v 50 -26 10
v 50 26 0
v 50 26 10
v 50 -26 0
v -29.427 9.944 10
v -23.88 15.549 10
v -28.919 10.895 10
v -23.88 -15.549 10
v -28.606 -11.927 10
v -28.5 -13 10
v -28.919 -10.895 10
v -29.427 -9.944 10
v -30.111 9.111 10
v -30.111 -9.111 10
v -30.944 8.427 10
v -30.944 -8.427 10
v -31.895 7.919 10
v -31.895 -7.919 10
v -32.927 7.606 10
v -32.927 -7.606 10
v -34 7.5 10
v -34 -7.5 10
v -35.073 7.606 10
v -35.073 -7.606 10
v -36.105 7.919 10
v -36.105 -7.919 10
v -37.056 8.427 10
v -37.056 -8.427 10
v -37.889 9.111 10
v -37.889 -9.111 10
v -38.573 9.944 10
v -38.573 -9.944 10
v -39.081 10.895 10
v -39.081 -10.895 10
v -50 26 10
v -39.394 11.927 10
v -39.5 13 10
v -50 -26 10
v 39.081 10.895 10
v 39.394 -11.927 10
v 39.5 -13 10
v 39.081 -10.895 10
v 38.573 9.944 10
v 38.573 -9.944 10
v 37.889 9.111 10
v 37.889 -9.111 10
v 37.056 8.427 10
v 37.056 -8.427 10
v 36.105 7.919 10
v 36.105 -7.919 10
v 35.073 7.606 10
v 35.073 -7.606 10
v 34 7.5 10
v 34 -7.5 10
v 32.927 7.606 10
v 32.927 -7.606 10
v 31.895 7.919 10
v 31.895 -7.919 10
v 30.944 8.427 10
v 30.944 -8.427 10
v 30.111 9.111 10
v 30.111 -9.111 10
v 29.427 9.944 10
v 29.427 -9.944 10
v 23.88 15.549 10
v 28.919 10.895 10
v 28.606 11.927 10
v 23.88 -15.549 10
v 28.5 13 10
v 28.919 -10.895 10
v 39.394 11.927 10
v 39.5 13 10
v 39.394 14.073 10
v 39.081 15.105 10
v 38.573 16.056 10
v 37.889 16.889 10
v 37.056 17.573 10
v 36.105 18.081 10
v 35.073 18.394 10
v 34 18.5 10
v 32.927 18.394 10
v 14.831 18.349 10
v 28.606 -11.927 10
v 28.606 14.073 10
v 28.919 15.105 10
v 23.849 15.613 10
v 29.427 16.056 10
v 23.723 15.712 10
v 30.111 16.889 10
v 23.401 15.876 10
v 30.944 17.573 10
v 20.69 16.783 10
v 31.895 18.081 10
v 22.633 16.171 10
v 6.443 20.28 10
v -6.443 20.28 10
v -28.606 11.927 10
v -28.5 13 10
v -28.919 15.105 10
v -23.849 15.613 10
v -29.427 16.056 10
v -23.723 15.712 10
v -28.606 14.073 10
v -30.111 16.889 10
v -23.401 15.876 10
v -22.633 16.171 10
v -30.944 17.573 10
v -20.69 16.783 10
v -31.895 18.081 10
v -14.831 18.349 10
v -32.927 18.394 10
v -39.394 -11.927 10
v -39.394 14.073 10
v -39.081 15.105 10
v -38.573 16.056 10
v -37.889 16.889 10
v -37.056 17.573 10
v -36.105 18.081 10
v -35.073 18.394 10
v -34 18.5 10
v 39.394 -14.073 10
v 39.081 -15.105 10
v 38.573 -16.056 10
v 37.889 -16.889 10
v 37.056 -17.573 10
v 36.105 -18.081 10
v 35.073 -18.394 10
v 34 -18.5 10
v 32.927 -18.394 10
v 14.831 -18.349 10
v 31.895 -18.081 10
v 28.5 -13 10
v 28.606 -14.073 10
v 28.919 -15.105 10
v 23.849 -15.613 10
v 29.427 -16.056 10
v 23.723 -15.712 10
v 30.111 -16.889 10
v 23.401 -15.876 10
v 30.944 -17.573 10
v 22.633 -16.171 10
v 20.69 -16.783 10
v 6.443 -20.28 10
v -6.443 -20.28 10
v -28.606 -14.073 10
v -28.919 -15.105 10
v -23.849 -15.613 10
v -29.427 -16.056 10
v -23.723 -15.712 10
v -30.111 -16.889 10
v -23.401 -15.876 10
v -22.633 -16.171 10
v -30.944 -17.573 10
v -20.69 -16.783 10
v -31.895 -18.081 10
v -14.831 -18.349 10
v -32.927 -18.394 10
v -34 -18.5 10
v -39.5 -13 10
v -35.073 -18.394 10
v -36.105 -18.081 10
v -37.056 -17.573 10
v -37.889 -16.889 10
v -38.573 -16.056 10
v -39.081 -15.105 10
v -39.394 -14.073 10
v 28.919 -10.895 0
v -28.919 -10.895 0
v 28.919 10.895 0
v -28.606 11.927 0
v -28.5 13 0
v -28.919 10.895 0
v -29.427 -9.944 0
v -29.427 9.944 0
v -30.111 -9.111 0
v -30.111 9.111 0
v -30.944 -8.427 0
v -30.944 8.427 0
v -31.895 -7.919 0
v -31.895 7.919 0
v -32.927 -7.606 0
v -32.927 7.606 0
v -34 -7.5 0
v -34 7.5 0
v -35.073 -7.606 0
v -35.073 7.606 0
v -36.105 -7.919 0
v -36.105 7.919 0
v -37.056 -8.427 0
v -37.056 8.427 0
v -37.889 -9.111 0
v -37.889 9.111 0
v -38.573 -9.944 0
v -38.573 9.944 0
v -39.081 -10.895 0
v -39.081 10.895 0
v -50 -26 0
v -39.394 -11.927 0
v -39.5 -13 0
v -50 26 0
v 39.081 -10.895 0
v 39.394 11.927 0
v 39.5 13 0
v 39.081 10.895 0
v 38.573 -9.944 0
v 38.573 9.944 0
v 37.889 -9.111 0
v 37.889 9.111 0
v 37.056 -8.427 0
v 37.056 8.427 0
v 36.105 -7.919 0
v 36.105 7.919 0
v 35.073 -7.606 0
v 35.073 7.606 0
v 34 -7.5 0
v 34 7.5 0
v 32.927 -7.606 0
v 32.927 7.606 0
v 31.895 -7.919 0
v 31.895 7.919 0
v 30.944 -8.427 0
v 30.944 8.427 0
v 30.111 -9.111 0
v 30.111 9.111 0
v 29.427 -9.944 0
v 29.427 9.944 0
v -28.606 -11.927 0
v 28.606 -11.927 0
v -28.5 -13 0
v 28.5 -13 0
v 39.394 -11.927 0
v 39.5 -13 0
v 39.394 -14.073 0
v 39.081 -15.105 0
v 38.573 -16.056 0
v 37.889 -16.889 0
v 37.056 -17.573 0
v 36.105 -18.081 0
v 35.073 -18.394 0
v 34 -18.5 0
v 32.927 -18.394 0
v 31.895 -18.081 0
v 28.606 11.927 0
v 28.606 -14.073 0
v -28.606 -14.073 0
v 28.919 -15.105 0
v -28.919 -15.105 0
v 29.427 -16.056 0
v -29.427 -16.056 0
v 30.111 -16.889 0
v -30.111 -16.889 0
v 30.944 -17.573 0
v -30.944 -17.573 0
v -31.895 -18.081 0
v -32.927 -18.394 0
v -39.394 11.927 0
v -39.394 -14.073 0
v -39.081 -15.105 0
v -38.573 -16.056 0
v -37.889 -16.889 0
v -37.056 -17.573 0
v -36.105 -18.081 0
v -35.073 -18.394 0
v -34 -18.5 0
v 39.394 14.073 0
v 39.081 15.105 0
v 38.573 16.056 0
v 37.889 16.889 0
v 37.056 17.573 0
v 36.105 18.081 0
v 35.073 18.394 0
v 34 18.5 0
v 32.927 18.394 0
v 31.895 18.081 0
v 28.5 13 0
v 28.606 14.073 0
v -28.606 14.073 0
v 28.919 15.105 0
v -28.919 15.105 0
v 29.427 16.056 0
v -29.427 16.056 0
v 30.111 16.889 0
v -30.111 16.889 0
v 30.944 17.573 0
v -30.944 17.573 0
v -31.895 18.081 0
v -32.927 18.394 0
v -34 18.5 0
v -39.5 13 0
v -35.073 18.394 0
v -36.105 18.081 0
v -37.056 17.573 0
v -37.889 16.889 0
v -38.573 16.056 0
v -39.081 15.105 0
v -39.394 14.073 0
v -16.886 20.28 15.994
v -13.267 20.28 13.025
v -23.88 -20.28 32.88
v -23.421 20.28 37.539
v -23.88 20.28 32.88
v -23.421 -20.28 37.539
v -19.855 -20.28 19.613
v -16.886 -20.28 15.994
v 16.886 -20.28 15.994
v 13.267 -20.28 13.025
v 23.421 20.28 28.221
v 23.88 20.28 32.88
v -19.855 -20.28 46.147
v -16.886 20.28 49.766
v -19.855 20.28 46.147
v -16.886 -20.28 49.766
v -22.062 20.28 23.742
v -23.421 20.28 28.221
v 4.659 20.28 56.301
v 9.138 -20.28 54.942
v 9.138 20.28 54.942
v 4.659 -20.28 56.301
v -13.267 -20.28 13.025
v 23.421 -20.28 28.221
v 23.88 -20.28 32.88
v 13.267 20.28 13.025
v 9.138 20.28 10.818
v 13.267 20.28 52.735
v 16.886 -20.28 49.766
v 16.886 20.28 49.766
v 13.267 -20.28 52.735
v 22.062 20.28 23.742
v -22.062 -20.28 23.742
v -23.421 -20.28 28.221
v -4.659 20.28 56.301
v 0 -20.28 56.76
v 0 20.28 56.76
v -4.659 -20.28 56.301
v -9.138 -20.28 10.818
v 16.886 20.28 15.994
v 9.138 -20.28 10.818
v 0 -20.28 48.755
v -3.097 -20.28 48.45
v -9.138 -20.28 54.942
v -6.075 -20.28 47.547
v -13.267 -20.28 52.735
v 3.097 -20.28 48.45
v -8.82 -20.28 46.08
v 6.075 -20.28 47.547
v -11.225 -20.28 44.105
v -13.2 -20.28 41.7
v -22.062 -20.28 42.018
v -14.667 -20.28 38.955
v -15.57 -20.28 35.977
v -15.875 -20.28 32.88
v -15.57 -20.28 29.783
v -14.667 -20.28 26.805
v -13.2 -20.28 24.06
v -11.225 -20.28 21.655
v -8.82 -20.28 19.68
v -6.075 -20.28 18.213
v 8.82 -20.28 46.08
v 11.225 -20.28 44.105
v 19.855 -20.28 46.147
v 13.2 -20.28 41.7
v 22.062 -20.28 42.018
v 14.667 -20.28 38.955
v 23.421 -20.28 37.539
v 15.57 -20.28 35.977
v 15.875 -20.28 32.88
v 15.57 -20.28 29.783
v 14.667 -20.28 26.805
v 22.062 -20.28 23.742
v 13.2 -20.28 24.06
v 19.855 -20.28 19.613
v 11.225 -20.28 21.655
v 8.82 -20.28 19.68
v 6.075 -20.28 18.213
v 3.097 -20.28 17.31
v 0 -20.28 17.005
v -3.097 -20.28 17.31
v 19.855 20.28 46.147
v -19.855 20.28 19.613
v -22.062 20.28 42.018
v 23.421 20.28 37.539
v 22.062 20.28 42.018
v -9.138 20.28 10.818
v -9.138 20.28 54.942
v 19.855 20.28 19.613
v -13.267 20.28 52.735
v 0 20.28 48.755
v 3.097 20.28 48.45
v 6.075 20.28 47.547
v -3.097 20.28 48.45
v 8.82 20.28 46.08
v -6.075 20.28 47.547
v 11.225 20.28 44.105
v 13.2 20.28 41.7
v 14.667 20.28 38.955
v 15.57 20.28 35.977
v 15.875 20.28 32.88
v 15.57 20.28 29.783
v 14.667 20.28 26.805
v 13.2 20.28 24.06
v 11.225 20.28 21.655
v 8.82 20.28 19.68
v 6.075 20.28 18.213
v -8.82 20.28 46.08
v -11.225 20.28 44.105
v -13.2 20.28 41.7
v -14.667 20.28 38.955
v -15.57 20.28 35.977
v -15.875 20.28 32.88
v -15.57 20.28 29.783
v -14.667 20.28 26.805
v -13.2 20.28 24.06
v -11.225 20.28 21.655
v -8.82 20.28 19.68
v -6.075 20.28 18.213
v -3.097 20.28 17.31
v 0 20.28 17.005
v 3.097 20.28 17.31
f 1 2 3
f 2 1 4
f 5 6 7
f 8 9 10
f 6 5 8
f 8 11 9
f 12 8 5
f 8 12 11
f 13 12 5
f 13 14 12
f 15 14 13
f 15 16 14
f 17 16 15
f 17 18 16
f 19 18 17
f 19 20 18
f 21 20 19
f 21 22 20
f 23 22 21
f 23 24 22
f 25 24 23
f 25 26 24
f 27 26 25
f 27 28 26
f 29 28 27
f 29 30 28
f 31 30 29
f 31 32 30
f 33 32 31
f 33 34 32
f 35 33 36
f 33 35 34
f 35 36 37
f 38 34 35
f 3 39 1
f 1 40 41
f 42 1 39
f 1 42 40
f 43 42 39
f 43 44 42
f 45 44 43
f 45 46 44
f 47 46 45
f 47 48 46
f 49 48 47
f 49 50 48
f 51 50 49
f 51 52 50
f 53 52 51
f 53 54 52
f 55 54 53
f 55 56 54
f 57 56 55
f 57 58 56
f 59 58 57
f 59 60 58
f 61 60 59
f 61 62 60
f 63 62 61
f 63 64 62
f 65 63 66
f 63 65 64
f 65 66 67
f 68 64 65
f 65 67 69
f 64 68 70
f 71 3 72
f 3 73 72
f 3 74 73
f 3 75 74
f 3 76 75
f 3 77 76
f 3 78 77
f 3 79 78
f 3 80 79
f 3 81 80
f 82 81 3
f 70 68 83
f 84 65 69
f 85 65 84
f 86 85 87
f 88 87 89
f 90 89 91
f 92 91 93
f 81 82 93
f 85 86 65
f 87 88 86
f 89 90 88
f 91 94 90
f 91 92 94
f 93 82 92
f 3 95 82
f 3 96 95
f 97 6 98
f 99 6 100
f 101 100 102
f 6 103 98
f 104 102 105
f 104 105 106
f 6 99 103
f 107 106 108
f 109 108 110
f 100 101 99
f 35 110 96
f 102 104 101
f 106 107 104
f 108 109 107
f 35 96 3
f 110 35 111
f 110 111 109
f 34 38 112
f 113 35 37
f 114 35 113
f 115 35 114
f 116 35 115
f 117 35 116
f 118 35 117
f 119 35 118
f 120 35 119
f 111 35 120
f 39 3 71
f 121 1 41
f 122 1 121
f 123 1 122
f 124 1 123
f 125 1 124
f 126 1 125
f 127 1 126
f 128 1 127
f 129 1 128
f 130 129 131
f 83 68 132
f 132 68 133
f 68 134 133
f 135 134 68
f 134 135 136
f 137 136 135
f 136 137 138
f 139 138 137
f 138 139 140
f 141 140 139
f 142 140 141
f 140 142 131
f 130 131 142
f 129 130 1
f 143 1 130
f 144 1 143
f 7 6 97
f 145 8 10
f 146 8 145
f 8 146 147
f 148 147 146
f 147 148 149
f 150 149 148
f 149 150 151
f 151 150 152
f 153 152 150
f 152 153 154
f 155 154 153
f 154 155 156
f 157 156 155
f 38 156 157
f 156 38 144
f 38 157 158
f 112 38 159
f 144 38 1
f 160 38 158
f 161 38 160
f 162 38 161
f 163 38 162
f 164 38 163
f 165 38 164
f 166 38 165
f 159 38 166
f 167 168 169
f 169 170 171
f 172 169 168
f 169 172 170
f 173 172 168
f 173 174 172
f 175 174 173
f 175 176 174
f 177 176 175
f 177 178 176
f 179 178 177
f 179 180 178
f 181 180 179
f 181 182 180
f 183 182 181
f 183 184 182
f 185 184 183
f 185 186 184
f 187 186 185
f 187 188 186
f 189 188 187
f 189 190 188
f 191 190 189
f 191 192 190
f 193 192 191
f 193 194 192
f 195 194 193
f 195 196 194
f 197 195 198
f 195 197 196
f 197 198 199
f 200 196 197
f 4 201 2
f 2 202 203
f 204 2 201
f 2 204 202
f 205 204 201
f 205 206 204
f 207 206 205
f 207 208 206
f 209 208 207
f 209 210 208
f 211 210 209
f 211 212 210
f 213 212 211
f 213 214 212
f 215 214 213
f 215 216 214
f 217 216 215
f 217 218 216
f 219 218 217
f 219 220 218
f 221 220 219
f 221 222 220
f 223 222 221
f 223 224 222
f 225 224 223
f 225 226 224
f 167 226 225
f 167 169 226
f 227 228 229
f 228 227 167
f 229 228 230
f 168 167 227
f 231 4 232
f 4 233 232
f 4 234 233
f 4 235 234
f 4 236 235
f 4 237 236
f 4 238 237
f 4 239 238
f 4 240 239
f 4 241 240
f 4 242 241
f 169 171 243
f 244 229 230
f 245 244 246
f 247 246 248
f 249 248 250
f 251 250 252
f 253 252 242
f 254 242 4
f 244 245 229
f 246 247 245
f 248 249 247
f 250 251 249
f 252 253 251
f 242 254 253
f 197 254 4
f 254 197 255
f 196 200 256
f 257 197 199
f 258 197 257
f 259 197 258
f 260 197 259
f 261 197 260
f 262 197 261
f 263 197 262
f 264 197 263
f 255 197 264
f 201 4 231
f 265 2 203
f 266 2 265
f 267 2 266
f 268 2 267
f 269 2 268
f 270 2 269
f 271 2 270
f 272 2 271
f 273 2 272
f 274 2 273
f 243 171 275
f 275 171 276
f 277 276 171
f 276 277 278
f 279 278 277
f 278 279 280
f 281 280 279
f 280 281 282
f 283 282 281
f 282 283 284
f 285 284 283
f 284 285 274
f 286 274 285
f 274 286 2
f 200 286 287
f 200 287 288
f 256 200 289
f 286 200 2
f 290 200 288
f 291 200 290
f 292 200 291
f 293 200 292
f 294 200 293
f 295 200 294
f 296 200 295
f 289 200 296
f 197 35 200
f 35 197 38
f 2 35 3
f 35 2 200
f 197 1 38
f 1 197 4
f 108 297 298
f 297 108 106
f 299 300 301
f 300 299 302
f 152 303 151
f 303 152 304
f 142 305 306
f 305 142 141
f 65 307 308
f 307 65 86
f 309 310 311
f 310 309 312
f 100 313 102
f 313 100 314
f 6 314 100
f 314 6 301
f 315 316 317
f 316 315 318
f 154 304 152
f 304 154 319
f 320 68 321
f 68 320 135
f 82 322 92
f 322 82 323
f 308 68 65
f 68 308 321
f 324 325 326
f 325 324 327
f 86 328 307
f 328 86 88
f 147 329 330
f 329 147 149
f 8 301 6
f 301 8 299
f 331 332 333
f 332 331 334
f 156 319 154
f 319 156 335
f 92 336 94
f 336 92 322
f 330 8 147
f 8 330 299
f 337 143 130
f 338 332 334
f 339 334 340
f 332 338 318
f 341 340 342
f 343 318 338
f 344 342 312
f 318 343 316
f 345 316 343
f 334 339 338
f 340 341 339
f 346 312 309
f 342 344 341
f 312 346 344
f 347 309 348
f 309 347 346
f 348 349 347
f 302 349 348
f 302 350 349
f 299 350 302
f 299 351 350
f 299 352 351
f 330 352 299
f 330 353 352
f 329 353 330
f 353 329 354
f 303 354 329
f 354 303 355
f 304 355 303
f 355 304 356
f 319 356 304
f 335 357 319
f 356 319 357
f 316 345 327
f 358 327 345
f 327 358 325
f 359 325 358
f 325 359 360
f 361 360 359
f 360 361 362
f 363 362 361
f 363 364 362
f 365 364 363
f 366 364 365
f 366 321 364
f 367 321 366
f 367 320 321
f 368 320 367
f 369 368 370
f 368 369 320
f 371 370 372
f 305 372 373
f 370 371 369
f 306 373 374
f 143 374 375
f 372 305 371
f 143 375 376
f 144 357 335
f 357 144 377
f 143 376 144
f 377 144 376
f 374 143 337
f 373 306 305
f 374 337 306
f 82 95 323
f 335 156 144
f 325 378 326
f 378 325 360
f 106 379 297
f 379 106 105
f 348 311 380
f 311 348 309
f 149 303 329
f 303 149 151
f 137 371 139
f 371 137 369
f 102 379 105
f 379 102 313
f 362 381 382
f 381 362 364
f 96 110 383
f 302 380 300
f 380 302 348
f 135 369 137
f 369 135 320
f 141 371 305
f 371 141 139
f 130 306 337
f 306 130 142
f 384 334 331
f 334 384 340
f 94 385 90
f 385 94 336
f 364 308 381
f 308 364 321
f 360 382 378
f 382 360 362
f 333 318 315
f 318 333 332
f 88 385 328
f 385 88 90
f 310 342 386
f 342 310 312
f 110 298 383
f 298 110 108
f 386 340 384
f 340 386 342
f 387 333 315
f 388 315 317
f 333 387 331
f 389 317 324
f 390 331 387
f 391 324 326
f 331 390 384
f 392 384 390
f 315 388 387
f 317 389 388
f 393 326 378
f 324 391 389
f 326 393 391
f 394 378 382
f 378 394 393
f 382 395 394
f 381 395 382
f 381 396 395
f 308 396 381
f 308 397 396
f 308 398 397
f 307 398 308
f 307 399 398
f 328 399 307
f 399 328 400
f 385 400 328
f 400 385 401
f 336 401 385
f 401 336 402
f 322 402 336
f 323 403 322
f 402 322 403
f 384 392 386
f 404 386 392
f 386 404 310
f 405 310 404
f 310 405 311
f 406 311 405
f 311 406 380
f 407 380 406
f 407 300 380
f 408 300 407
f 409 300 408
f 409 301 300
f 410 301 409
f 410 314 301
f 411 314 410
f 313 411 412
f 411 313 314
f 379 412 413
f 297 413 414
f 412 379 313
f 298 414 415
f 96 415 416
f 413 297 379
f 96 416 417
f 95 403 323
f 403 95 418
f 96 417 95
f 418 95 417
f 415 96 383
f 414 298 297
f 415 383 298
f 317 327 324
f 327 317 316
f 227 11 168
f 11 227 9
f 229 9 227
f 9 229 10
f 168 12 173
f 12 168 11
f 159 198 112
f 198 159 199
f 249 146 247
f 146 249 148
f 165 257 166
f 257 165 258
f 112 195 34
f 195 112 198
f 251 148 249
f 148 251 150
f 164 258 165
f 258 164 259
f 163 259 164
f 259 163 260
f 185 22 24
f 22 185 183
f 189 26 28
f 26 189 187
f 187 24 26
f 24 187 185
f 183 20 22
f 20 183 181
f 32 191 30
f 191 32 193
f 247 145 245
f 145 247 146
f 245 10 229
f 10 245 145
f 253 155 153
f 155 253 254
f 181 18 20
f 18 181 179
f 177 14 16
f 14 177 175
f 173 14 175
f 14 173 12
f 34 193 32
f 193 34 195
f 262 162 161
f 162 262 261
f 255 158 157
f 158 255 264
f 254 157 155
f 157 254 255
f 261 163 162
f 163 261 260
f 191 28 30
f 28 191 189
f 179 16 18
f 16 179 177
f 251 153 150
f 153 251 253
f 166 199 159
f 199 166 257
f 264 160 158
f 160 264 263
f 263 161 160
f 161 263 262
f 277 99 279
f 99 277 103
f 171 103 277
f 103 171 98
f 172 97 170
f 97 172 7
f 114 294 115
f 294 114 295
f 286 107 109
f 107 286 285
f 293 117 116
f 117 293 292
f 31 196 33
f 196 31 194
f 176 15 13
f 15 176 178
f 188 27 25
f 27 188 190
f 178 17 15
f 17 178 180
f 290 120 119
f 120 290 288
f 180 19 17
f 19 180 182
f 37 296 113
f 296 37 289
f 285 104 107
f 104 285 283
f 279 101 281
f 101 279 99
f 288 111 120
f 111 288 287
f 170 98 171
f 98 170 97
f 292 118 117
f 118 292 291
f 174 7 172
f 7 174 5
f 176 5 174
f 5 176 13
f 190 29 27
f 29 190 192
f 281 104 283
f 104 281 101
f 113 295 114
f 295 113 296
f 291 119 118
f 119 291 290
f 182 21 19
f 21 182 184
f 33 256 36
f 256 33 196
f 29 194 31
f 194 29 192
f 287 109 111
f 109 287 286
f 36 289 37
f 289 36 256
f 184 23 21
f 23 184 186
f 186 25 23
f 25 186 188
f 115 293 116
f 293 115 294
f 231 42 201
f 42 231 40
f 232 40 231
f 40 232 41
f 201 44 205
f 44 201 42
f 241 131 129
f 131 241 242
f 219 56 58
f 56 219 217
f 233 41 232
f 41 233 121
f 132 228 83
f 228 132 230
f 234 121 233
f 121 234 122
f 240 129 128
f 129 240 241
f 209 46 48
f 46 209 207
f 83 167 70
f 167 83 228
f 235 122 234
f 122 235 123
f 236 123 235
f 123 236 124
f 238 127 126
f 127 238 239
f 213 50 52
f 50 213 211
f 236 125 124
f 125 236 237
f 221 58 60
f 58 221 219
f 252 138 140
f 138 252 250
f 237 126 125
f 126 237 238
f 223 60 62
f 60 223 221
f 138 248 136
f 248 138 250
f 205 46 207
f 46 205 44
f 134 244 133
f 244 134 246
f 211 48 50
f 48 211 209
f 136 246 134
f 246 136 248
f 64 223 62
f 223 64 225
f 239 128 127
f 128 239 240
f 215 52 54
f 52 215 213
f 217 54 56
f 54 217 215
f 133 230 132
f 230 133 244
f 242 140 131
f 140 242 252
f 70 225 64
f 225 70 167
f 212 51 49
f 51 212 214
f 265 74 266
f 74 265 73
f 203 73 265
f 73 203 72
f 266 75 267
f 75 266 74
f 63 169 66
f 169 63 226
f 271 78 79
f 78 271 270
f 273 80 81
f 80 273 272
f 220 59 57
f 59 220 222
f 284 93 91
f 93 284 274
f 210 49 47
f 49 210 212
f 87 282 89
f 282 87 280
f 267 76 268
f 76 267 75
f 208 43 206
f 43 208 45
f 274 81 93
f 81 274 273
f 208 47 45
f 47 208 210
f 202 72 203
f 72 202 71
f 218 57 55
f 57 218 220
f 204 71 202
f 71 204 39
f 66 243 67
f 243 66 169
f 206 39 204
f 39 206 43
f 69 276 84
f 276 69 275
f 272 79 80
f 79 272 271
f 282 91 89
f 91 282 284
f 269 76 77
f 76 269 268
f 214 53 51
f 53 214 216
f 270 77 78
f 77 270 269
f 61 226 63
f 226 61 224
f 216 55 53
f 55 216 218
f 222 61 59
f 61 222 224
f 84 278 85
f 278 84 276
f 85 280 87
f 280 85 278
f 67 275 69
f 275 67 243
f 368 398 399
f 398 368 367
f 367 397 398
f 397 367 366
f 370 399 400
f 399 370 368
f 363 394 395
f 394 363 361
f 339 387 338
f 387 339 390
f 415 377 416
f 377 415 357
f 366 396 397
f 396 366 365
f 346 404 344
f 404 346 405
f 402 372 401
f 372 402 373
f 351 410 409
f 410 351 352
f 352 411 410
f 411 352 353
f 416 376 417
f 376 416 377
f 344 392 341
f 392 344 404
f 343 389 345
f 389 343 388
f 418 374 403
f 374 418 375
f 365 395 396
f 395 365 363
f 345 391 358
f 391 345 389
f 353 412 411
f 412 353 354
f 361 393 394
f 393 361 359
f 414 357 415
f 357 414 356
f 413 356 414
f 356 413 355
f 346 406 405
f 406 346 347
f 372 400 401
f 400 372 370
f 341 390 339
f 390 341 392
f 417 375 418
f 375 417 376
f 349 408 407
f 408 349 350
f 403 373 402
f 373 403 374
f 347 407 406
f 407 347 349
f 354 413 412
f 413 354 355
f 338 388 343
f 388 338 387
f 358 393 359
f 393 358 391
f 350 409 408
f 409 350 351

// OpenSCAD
$fn = 32;

// ----------------------------------------------------------------------
// Bearing block: 100 x 52 mm base, 31.75 mm bore at 32.88 mm
// ----------------------------------------------------------------------

// --- parameters (mm) ---
base_w = 100;             // base width
base_d = 52;              // base depth
base_t = 10;              // base thickness
bore_d = 31.75;           // shaft / bearing bore
house_r = 23.88;          // housing outer radius
house_len = 40.56;        // housing length along the shaft
foot_w = 47.76;           // foot width under the housing
foot_len = 30.56;         // foot length along the shaft
axis_z = 32.88;           // bore axis height above the base
holes_d = 11;             // mounting holes
hole_x = 34;              // mounting hole spacing

difference() {
  union() {
    /* base plate with its underside on z = 0 */
    translate([0, 0, base_t / 2]) cube([base_w, base_d, base_t], center = true);
    /* hull foot: a straight web blending into the round housing */
    hull() {
      translate([0, 0, base_t - 0.5]) cube([foot_w, foot_len, 1.6], center = true);
      translate([0, 0, axis_z]) rotate([-90, 0, 0]) cylinder(h = house_len, d = 2 * house_r, center = true);
    }
  }
  /* bore through the housing, 2.5 mm clear on both sides */
  translate([0, 0, axis_z]) rotate([-90, 0, 0]) cylinder(h = house_len + 5, d = bore_d, center = true);
  /* mounting holes through the base plate */
  for (hx = [-34, 34]) {
    for (hy = [-13, 13]) {
      translate([hx, hy, -2.5]) cylinder(h = base_t + 5, d = holes_d);
    }
  }
}
